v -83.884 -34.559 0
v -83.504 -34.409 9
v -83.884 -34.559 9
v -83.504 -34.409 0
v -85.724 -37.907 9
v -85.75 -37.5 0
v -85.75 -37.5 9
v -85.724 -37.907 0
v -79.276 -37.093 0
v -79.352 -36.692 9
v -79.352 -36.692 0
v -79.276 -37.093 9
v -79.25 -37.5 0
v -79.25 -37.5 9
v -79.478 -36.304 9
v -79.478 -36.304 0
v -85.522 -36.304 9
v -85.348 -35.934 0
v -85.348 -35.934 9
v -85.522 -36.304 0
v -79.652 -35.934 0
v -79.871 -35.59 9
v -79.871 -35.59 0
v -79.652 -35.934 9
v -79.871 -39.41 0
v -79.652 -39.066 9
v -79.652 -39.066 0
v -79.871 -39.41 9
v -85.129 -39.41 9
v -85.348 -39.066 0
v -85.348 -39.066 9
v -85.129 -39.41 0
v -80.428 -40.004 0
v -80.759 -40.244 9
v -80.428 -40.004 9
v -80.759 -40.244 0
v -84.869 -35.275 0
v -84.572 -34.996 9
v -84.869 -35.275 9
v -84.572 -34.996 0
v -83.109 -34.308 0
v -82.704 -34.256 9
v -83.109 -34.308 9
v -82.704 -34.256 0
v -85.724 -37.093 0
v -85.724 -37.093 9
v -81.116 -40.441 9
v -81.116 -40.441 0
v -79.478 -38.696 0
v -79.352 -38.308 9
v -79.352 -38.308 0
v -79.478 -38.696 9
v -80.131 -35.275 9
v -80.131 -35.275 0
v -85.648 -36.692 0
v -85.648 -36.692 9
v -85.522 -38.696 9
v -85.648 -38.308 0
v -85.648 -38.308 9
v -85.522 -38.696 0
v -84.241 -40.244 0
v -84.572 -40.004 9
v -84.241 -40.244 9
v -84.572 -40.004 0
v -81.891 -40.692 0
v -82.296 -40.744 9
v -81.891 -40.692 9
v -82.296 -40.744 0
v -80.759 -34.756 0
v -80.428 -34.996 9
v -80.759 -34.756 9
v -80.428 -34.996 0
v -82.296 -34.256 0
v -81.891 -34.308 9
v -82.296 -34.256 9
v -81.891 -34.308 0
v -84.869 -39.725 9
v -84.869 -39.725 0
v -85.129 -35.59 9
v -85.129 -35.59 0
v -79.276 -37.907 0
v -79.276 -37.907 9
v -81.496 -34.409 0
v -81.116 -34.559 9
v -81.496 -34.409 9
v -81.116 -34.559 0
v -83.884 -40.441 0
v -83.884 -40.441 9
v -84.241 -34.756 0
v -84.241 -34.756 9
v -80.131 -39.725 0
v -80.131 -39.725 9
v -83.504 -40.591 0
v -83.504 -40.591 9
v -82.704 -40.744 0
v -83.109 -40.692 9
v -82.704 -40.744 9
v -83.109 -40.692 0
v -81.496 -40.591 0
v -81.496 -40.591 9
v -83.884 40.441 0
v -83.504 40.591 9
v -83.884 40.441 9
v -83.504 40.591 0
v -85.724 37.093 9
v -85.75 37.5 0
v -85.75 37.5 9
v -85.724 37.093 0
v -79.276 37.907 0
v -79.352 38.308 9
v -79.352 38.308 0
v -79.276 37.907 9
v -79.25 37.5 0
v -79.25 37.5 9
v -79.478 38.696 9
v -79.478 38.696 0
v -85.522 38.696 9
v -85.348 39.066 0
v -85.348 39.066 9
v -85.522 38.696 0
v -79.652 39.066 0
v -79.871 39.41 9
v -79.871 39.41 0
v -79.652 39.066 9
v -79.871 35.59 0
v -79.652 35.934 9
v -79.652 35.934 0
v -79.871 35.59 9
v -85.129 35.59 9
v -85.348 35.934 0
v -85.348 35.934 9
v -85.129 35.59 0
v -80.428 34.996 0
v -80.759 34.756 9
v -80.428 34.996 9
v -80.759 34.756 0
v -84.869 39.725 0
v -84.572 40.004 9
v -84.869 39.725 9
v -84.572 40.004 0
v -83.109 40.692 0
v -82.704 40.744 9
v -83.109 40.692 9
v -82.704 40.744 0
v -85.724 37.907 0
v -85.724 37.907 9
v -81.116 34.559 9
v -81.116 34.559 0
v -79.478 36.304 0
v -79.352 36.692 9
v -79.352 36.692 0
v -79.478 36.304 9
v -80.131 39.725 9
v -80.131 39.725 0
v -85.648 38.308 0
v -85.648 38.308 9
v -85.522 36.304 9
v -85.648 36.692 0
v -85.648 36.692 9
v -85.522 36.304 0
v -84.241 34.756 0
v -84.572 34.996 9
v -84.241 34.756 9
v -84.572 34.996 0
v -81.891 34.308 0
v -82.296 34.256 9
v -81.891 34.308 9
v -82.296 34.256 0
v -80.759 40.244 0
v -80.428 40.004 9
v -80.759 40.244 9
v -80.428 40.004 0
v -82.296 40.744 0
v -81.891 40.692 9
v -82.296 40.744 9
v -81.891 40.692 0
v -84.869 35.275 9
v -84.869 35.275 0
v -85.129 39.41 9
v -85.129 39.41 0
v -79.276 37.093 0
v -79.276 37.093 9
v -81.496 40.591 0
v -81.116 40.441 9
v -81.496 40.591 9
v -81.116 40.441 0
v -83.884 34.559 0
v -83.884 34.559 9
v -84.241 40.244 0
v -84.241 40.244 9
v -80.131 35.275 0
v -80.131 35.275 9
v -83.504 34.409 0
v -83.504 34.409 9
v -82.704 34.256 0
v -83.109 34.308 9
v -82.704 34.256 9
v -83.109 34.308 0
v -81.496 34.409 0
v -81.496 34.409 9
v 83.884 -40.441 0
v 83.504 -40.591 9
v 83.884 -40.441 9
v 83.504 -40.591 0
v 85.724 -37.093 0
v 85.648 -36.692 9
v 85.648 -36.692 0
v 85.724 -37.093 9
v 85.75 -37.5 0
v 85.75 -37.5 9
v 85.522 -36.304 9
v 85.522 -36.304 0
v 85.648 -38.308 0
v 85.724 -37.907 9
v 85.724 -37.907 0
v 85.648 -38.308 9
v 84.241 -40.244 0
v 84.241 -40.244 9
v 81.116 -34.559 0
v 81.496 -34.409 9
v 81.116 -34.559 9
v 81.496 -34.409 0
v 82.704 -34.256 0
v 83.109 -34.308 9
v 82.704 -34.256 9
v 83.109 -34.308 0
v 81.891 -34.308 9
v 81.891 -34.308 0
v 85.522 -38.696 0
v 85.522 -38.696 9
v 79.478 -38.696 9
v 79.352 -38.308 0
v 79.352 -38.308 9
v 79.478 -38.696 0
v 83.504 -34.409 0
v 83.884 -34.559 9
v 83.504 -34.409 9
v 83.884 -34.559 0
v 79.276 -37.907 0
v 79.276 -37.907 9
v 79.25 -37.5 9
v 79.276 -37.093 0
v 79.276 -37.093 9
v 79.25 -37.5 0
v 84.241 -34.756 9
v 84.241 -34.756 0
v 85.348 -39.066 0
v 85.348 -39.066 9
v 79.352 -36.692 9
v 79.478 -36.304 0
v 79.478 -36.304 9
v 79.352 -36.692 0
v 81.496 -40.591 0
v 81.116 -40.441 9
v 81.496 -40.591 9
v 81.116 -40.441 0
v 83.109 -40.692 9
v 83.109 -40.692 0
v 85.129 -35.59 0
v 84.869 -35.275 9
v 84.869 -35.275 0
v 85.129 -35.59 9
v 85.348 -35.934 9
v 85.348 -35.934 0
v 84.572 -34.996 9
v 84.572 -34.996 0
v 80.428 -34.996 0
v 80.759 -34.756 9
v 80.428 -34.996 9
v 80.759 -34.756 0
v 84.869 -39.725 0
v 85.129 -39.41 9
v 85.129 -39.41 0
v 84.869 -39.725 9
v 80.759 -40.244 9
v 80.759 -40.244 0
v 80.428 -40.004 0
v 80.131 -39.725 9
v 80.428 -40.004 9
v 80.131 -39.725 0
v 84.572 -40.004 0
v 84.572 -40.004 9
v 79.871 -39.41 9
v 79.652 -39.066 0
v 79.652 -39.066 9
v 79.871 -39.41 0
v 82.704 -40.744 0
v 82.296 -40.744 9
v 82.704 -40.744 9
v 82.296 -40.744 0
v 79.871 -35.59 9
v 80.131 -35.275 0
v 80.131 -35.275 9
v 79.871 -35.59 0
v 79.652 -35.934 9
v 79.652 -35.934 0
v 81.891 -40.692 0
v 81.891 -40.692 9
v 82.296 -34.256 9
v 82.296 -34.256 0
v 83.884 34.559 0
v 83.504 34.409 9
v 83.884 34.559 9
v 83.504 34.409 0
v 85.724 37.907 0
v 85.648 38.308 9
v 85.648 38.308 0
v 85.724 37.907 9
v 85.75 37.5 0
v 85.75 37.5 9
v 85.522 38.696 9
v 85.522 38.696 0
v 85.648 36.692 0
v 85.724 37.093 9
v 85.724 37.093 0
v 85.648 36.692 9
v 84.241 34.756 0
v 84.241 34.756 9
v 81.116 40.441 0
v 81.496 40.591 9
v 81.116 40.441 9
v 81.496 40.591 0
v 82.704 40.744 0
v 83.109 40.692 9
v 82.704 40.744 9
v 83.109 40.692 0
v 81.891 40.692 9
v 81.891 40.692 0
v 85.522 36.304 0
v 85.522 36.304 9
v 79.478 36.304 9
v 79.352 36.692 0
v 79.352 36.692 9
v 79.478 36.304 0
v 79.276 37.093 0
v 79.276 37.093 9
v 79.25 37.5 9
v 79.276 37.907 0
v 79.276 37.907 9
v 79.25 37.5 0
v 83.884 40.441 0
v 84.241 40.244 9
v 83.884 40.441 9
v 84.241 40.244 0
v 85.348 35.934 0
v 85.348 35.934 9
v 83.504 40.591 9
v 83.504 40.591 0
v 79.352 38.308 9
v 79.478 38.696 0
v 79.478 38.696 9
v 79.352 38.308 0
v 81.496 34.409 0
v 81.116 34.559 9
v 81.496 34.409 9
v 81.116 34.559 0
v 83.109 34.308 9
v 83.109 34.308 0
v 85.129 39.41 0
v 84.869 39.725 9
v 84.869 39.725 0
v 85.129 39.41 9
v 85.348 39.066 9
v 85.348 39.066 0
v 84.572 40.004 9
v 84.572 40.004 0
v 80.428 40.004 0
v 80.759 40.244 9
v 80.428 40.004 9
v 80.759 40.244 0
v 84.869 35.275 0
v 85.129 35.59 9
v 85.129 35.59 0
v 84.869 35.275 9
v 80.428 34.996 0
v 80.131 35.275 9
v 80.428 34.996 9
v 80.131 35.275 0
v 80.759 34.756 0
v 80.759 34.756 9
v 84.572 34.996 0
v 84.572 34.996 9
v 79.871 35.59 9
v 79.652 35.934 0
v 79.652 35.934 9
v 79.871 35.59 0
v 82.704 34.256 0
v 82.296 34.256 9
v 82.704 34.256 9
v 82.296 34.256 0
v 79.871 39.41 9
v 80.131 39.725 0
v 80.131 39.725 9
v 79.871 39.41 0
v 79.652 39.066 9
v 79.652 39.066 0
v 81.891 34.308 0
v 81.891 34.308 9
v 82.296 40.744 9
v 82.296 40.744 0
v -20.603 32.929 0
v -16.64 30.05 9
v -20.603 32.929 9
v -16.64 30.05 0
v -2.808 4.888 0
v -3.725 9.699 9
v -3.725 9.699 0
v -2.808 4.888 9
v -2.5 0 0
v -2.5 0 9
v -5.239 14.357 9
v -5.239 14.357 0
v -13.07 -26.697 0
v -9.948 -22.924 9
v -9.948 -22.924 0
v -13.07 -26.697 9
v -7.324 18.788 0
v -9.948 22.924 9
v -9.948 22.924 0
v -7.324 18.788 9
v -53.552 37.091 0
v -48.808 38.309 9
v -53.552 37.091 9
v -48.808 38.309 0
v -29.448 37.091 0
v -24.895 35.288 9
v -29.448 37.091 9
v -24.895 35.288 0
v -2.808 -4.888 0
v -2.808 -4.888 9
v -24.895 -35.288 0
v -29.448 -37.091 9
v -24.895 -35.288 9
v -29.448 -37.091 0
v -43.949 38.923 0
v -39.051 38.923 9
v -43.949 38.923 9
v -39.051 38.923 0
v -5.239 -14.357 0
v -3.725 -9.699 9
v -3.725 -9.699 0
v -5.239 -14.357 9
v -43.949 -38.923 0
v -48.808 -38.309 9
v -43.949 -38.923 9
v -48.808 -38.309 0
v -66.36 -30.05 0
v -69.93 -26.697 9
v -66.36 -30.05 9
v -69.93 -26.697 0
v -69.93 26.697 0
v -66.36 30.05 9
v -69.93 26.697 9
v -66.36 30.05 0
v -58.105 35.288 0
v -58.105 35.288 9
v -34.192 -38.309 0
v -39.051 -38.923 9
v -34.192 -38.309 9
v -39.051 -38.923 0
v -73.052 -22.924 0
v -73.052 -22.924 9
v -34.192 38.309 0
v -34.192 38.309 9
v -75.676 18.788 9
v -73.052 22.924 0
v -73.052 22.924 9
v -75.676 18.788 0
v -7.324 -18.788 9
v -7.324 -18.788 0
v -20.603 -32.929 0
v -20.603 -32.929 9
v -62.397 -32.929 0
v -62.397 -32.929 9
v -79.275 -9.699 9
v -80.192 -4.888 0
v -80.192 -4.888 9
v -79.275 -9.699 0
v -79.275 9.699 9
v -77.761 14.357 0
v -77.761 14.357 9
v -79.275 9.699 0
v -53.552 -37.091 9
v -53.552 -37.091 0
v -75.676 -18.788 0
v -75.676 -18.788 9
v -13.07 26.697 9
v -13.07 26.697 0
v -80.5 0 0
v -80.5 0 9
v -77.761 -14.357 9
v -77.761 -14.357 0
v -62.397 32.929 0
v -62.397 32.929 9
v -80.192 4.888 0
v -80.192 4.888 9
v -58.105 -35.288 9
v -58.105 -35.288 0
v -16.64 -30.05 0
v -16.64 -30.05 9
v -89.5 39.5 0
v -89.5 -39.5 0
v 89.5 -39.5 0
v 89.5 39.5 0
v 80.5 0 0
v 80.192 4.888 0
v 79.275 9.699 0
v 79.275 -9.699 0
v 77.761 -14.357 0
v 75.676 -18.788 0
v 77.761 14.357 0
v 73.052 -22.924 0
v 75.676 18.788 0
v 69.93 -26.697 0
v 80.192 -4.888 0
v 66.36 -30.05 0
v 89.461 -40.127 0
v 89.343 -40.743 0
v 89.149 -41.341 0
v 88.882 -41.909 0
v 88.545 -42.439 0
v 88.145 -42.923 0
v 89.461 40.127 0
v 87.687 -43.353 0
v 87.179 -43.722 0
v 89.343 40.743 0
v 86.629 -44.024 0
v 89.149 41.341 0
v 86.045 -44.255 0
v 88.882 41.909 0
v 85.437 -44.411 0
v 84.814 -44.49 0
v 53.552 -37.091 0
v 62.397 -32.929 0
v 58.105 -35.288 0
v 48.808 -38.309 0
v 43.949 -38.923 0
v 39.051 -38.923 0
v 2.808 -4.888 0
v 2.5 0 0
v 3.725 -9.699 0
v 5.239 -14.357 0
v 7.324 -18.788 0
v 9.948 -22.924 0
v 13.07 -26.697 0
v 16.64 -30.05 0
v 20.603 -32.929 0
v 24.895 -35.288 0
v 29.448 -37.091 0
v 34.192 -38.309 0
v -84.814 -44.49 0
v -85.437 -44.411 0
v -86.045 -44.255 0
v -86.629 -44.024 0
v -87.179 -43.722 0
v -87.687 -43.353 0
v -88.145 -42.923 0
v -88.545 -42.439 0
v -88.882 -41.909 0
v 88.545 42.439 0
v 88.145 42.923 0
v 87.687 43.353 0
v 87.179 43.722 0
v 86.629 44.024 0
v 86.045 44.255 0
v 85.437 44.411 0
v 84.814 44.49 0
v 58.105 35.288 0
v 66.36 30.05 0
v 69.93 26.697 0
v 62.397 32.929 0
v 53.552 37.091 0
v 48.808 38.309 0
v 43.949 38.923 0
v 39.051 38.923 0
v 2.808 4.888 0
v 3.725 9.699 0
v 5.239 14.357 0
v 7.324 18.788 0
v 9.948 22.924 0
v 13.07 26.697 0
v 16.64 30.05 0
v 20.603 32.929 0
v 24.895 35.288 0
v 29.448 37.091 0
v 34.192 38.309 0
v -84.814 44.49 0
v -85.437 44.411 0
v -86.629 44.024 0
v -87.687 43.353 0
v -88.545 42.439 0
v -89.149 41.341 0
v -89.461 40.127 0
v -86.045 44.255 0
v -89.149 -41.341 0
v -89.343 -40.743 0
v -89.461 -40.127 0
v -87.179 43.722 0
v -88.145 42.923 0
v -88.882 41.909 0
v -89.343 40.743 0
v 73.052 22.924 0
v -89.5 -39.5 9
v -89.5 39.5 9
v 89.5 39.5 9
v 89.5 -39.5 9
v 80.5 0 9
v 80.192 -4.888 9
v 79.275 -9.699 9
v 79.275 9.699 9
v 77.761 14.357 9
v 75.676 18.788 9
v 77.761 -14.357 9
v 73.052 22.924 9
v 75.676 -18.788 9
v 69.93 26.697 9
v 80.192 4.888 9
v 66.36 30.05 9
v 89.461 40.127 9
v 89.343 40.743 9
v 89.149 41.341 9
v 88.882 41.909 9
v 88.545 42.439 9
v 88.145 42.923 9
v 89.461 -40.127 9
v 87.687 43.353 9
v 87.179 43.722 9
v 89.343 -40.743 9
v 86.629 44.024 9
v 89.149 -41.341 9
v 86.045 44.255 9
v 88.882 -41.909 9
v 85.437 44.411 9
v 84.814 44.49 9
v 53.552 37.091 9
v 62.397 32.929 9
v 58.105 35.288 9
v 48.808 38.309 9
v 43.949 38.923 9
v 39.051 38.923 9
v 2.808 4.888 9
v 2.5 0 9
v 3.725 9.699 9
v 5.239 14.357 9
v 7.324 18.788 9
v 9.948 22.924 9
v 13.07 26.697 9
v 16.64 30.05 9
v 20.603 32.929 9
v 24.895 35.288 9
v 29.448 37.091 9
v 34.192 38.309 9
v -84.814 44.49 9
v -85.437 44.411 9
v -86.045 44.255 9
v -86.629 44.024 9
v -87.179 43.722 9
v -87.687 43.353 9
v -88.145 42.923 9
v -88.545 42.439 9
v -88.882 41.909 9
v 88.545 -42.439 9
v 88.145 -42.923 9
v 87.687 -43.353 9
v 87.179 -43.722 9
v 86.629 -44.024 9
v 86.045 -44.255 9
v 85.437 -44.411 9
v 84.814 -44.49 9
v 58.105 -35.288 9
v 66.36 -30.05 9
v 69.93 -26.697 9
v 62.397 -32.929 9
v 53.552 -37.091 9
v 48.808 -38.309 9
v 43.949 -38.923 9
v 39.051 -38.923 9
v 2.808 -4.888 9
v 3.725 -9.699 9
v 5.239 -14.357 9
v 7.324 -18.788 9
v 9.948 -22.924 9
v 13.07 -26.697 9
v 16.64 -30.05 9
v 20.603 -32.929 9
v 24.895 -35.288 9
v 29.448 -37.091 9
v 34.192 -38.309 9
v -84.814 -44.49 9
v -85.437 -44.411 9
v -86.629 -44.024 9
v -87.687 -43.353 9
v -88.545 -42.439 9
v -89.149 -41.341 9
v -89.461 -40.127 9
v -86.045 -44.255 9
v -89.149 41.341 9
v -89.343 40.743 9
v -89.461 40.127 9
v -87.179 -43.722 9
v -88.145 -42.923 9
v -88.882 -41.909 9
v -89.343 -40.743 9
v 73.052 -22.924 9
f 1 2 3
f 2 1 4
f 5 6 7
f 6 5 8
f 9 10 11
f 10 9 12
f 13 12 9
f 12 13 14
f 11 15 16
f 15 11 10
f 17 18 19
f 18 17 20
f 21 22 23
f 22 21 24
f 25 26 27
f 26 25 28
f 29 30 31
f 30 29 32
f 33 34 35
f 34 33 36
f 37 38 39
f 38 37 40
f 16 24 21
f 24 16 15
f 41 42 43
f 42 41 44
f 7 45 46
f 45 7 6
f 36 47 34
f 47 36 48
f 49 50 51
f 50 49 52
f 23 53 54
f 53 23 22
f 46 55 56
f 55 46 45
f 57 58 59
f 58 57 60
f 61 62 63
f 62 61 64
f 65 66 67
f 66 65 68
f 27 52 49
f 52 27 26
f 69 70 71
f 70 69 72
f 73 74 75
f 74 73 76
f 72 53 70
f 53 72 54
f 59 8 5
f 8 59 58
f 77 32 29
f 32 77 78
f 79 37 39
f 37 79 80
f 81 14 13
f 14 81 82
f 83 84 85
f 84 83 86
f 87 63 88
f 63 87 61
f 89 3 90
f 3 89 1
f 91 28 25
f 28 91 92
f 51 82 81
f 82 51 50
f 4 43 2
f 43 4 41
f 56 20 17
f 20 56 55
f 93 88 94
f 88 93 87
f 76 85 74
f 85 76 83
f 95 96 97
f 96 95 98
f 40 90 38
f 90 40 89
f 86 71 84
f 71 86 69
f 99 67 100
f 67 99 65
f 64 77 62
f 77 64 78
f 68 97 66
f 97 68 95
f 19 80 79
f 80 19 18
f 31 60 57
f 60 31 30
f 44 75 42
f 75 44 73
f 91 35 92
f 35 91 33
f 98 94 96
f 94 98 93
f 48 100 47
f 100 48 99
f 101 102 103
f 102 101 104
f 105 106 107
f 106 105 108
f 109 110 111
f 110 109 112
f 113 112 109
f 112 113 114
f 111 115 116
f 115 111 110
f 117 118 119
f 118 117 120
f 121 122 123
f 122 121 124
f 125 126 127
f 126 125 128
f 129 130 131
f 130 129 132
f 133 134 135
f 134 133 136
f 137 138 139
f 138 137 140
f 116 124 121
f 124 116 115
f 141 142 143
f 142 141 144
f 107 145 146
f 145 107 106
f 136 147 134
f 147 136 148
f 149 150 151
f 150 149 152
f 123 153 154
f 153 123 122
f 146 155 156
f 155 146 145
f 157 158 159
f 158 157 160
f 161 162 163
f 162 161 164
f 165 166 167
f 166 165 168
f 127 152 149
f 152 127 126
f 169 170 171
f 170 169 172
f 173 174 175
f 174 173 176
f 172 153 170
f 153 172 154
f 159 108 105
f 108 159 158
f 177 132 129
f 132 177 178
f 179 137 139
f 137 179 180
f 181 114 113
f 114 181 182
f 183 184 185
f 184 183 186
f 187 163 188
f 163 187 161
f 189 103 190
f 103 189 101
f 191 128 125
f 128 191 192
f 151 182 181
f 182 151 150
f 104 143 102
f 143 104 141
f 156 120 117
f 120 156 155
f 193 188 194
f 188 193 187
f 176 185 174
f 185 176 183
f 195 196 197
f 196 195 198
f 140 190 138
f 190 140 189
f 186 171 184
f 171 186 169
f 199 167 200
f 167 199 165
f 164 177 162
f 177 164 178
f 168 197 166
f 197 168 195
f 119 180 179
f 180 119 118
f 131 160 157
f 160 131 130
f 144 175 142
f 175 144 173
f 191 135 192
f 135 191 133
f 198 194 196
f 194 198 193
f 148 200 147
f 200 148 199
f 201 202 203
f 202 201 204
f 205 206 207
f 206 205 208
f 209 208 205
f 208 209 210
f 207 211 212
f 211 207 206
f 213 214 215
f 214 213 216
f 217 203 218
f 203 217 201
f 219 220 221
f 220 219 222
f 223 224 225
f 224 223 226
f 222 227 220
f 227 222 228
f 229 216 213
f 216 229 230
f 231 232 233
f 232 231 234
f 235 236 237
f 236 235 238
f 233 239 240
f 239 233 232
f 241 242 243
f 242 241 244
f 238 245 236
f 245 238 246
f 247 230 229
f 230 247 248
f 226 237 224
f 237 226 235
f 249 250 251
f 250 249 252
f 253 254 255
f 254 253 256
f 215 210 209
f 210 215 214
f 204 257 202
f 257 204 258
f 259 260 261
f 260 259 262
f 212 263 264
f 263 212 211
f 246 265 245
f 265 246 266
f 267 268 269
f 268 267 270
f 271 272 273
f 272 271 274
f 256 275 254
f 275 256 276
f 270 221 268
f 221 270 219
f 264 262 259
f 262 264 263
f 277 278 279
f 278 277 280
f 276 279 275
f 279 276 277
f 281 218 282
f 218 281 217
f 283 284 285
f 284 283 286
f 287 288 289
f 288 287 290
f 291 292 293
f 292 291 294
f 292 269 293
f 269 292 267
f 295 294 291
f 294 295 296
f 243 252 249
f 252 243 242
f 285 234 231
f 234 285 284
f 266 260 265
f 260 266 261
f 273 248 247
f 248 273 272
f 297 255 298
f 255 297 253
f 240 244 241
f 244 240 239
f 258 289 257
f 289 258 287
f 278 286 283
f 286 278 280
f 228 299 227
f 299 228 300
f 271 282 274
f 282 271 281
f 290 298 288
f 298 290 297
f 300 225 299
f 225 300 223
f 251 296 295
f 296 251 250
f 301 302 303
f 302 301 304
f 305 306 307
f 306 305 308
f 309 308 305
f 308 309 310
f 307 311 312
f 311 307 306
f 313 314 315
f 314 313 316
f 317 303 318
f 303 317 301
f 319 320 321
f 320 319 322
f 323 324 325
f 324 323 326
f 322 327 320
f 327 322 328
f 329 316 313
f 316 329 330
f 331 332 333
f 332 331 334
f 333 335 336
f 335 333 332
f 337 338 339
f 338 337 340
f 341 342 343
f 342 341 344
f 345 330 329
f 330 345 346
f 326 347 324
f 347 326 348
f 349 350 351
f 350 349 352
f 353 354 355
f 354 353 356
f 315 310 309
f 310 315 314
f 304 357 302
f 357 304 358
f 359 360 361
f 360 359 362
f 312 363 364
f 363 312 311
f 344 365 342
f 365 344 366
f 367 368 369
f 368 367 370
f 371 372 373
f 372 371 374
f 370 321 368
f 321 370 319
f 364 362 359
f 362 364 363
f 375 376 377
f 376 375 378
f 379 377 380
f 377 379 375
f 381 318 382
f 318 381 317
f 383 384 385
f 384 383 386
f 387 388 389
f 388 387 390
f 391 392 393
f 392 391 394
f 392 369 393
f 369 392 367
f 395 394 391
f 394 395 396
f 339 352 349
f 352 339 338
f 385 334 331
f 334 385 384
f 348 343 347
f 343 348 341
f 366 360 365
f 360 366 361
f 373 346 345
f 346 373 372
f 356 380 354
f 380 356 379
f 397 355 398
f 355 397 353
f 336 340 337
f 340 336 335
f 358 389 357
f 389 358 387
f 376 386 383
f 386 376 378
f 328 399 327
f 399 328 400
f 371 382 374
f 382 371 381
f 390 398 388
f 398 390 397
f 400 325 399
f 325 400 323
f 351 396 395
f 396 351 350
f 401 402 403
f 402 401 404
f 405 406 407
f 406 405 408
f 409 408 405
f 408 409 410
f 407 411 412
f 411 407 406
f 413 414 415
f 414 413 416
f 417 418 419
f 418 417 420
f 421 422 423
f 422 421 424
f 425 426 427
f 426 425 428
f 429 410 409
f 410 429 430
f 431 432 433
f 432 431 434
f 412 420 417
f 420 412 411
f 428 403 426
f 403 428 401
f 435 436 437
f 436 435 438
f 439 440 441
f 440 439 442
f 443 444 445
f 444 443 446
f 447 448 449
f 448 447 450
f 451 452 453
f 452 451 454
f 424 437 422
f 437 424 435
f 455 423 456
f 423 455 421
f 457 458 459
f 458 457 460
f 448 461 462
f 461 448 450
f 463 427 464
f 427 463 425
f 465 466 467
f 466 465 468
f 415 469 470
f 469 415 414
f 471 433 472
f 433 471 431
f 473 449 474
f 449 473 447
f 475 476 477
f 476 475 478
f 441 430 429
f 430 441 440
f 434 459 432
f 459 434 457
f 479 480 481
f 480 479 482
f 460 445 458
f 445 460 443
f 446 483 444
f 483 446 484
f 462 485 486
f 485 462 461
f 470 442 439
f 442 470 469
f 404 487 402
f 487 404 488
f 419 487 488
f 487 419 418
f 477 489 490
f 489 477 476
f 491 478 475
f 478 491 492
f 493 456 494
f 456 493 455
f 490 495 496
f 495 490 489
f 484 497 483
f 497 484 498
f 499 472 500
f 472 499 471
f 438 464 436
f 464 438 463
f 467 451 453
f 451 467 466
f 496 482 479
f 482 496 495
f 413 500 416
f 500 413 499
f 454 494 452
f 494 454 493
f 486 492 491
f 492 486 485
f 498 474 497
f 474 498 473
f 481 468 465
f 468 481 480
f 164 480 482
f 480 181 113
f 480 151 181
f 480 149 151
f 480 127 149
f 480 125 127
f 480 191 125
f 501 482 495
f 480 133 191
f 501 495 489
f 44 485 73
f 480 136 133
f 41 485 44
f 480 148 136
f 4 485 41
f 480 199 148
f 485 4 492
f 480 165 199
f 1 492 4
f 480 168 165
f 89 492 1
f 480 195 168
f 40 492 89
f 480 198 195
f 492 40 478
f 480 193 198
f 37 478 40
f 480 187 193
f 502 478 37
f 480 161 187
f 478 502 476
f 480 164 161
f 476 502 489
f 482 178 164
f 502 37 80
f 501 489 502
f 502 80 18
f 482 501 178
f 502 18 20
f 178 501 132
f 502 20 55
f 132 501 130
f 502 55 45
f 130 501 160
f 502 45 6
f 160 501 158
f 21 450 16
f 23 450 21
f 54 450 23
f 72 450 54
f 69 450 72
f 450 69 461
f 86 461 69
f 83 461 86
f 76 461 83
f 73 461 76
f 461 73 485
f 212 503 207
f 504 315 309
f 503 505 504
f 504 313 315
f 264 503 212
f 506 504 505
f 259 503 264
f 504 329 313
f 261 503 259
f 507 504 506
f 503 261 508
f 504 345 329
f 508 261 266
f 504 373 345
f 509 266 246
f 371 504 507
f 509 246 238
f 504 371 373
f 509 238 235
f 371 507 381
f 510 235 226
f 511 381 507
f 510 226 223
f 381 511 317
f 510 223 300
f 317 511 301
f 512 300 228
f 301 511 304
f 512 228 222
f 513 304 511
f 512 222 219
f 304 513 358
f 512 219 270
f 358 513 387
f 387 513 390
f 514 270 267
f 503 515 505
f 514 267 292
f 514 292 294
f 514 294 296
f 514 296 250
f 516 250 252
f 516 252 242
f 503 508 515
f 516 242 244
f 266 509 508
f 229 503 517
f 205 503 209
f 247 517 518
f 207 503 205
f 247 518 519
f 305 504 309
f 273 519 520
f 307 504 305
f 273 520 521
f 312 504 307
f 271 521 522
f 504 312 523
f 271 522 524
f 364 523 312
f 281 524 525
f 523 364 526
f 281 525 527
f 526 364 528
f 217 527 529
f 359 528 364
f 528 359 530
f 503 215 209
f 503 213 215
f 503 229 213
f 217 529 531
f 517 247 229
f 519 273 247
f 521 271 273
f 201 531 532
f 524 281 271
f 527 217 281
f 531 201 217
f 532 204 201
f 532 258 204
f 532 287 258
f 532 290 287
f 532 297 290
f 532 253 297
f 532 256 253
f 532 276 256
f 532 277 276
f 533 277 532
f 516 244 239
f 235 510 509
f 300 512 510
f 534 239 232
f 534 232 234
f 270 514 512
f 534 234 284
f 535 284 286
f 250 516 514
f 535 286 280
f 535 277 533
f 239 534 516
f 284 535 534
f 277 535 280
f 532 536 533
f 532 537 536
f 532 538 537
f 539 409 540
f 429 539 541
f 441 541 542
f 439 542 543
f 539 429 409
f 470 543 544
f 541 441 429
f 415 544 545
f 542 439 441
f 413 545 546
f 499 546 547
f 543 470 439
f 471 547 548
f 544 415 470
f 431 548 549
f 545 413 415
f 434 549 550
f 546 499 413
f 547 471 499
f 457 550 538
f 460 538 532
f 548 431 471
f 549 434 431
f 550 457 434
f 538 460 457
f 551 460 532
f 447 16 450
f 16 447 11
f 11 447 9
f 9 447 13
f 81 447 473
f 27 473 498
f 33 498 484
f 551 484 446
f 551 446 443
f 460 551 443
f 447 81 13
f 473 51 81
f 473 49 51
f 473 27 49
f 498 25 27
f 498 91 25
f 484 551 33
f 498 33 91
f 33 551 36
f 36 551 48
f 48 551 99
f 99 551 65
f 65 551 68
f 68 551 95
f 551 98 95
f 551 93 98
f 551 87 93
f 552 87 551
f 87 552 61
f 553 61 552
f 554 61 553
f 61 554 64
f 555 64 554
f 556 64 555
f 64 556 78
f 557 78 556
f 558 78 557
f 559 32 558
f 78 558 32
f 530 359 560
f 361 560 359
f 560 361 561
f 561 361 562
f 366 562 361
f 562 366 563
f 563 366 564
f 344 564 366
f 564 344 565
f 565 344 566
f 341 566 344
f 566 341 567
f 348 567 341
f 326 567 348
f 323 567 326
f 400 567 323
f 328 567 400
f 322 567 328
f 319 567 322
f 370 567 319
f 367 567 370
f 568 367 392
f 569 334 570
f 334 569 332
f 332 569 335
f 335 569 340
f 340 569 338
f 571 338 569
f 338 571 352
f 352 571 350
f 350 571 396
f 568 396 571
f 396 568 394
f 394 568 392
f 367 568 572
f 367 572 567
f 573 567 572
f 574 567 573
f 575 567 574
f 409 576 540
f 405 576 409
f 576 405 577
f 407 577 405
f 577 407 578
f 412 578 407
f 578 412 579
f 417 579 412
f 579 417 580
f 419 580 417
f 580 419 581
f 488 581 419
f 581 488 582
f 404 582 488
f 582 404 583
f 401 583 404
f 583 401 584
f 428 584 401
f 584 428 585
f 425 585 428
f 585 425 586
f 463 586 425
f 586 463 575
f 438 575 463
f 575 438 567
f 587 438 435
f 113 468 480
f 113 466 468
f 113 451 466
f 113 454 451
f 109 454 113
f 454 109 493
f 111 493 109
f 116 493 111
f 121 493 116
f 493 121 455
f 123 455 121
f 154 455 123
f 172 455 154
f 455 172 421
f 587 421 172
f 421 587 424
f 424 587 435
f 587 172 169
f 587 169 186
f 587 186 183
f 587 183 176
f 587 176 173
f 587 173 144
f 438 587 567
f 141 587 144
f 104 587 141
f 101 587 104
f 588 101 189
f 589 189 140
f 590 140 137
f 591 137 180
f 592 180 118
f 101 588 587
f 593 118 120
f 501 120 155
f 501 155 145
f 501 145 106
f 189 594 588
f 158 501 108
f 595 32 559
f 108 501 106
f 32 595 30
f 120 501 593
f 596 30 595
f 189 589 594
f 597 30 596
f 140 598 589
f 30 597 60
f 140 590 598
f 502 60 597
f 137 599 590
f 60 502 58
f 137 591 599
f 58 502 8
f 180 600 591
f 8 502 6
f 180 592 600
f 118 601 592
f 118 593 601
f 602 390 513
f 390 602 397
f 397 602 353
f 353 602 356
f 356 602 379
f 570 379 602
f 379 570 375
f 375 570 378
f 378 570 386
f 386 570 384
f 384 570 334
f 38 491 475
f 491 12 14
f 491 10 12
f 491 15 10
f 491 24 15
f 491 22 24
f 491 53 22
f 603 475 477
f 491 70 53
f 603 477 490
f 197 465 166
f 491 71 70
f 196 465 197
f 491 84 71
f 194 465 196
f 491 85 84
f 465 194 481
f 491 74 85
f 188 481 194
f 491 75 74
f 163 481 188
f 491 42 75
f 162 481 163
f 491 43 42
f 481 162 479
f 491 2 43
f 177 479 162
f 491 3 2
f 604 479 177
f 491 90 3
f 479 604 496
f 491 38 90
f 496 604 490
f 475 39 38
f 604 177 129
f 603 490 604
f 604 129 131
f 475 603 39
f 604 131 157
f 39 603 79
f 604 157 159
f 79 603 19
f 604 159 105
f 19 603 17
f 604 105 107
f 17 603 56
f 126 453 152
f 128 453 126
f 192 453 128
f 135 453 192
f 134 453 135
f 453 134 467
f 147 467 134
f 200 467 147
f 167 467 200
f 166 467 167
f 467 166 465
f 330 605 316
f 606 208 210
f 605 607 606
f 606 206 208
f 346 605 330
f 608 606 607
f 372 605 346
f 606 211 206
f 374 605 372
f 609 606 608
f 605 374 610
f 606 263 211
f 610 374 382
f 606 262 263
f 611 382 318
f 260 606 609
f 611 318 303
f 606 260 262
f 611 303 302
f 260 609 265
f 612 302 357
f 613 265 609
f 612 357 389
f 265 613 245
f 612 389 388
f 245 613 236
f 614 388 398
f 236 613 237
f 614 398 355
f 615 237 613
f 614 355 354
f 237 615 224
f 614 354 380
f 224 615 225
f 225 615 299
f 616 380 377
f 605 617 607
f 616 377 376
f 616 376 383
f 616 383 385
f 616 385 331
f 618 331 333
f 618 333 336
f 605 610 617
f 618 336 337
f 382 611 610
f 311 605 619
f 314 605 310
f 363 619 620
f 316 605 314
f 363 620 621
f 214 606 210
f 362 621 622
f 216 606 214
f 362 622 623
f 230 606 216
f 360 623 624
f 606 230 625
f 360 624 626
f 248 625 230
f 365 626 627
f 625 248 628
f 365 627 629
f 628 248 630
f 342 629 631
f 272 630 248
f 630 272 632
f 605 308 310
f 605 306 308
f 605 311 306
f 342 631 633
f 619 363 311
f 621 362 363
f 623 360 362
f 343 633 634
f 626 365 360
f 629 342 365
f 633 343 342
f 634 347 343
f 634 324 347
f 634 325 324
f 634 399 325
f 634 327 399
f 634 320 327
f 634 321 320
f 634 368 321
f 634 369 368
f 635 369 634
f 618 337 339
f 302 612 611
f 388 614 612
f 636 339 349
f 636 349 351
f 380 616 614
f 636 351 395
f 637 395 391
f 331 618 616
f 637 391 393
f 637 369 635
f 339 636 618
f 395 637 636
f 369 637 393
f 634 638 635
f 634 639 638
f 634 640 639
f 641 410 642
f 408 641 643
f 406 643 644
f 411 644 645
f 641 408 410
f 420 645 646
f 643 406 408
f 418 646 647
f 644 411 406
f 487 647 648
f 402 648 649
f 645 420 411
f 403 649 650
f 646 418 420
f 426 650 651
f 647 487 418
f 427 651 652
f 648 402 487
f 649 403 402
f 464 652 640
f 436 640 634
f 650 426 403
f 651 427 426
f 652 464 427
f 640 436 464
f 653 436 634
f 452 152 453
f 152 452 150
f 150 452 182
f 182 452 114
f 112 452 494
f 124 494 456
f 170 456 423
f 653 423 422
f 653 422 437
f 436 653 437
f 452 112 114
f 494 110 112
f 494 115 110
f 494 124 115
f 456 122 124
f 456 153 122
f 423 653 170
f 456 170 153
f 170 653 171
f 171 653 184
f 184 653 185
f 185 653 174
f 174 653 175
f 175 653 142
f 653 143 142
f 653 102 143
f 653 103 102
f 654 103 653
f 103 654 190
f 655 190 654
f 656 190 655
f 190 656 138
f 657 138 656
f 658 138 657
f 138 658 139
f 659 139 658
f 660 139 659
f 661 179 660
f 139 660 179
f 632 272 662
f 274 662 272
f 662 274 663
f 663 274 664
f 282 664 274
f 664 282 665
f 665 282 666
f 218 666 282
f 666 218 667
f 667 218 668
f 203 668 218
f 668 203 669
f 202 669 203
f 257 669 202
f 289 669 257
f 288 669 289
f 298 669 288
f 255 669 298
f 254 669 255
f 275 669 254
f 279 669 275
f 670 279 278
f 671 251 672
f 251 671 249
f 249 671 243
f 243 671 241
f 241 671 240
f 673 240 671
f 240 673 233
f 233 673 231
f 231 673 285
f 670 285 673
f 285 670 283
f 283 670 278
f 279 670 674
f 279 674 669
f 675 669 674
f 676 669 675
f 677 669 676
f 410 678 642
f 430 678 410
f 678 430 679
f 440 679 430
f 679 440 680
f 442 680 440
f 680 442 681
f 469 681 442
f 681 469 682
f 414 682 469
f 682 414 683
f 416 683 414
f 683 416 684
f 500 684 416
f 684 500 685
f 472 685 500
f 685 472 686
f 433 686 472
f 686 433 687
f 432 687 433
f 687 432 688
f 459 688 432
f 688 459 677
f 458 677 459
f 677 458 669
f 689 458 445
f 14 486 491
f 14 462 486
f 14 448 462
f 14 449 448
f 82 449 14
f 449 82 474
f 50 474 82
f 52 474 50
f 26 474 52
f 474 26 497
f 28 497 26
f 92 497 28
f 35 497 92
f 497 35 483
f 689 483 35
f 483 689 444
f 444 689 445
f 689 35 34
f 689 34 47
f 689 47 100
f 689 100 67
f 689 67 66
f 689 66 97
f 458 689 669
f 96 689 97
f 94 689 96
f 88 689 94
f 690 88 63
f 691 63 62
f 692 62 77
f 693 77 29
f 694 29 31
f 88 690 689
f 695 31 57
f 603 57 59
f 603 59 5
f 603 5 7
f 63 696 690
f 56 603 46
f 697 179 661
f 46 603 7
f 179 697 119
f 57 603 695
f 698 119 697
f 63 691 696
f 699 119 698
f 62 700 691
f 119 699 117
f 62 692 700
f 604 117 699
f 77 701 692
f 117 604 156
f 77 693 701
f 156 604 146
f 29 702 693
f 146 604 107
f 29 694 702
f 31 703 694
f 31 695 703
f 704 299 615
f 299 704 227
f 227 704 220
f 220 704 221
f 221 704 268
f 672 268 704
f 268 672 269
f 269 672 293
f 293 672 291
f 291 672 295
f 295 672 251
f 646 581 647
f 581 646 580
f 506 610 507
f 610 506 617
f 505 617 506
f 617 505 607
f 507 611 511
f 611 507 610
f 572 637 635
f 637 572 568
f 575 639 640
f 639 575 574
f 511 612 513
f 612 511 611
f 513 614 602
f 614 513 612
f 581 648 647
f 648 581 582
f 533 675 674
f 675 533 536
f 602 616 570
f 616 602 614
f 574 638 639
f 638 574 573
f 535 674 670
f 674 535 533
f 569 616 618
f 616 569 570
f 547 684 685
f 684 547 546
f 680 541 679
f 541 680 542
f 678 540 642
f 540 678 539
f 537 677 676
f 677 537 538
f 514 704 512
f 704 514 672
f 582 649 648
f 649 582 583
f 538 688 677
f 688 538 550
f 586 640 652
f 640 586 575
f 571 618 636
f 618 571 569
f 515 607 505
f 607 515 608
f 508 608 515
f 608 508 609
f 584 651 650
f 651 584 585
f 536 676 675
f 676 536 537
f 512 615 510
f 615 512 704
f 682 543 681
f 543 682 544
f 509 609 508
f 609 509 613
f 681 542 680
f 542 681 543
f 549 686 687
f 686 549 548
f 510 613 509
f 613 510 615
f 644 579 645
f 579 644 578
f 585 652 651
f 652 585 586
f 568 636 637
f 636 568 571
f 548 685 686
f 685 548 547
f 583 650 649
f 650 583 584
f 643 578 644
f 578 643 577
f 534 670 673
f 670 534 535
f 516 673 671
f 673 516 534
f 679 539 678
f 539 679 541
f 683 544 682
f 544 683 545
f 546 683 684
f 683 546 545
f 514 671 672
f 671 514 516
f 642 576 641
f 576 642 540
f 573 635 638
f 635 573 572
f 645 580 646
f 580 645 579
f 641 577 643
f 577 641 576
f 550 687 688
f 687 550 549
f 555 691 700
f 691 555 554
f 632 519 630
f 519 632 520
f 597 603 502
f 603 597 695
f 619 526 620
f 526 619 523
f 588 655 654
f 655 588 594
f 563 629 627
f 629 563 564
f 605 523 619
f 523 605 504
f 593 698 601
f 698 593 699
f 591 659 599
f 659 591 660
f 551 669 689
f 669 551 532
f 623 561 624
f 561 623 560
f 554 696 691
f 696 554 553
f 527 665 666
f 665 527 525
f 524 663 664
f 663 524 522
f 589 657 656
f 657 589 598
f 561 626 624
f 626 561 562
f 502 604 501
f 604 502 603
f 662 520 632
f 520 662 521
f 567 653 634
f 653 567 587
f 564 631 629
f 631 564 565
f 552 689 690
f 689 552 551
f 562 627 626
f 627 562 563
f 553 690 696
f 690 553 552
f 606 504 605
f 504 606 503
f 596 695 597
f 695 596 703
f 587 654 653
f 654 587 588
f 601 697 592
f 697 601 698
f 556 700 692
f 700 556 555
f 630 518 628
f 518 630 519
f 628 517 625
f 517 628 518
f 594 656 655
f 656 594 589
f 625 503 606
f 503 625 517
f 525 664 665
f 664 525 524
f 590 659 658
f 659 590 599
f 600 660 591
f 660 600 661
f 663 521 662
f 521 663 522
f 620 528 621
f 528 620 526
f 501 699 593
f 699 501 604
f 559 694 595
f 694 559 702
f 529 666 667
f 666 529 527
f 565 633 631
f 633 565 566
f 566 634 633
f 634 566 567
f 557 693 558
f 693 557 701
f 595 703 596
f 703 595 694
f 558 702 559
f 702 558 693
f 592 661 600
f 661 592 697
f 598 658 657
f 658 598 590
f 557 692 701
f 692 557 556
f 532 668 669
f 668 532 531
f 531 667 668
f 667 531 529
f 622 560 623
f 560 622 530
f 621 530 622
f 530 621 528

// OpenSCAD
$fn = 50;

difference() {
	union() {
		hull() {
			translate(v = [-84.5, 39.5, 0]) {
				cylinder(h = 9, r = 5);
			}
			translate(v = [84.5, 39.5, 0]) {
				cylinder(h = 9, r = 5);
			}
			translate(v = [-84.5, -39.5, 0]) {
				cylinder(h = 9, r = 5);
			}
			translate(v = [84.5, -39.5, 0]) {
				cylinder(h = 9, r = 5);
			}
		}
	}
	union() {
		translate(v = [-82.5, -37.5, -100.0]) {
			cylinder(h = 200, r = 3.25);
		}
		translate(v = [-82.5, 37.5, -100.0]) {
			cylinder(h = 200, r = 3.25);
		}
		translate(v = [82.5, -37.5, -100.0]) {
			cylinder(h = 200, r = 3.25);
		}
		translate(v = [82.5, 37.5, -100.0]) {
			cylinder(h = 200, r = 3.25);
		}
		translate(v = [-82.5, -37.5, -100.0]) {
			cylinder(h = 200, r = 1.8);
		}
		translate(v = [-82.5, 37.5, -100.0]) {
			cylinder(h = 200, r = 1.8);
		}
		translate(v = [82.5, -37.5, -100.0]) {
			cylinder(h = 200, r = 1.8);
		}
		translate(v = [82.5, 37.5, -100.0]) {
			cylinder(h = 200, r = 1.8);
		}
		translate(v = [-41.5, 0, 0.0]) {
			cylinder(h = 9, r = 39.0);
		}
		translate(v = [41.5, 0, 0.0]) {
			cylinder(h = 9, r = 39.0);
		}
	}
}
